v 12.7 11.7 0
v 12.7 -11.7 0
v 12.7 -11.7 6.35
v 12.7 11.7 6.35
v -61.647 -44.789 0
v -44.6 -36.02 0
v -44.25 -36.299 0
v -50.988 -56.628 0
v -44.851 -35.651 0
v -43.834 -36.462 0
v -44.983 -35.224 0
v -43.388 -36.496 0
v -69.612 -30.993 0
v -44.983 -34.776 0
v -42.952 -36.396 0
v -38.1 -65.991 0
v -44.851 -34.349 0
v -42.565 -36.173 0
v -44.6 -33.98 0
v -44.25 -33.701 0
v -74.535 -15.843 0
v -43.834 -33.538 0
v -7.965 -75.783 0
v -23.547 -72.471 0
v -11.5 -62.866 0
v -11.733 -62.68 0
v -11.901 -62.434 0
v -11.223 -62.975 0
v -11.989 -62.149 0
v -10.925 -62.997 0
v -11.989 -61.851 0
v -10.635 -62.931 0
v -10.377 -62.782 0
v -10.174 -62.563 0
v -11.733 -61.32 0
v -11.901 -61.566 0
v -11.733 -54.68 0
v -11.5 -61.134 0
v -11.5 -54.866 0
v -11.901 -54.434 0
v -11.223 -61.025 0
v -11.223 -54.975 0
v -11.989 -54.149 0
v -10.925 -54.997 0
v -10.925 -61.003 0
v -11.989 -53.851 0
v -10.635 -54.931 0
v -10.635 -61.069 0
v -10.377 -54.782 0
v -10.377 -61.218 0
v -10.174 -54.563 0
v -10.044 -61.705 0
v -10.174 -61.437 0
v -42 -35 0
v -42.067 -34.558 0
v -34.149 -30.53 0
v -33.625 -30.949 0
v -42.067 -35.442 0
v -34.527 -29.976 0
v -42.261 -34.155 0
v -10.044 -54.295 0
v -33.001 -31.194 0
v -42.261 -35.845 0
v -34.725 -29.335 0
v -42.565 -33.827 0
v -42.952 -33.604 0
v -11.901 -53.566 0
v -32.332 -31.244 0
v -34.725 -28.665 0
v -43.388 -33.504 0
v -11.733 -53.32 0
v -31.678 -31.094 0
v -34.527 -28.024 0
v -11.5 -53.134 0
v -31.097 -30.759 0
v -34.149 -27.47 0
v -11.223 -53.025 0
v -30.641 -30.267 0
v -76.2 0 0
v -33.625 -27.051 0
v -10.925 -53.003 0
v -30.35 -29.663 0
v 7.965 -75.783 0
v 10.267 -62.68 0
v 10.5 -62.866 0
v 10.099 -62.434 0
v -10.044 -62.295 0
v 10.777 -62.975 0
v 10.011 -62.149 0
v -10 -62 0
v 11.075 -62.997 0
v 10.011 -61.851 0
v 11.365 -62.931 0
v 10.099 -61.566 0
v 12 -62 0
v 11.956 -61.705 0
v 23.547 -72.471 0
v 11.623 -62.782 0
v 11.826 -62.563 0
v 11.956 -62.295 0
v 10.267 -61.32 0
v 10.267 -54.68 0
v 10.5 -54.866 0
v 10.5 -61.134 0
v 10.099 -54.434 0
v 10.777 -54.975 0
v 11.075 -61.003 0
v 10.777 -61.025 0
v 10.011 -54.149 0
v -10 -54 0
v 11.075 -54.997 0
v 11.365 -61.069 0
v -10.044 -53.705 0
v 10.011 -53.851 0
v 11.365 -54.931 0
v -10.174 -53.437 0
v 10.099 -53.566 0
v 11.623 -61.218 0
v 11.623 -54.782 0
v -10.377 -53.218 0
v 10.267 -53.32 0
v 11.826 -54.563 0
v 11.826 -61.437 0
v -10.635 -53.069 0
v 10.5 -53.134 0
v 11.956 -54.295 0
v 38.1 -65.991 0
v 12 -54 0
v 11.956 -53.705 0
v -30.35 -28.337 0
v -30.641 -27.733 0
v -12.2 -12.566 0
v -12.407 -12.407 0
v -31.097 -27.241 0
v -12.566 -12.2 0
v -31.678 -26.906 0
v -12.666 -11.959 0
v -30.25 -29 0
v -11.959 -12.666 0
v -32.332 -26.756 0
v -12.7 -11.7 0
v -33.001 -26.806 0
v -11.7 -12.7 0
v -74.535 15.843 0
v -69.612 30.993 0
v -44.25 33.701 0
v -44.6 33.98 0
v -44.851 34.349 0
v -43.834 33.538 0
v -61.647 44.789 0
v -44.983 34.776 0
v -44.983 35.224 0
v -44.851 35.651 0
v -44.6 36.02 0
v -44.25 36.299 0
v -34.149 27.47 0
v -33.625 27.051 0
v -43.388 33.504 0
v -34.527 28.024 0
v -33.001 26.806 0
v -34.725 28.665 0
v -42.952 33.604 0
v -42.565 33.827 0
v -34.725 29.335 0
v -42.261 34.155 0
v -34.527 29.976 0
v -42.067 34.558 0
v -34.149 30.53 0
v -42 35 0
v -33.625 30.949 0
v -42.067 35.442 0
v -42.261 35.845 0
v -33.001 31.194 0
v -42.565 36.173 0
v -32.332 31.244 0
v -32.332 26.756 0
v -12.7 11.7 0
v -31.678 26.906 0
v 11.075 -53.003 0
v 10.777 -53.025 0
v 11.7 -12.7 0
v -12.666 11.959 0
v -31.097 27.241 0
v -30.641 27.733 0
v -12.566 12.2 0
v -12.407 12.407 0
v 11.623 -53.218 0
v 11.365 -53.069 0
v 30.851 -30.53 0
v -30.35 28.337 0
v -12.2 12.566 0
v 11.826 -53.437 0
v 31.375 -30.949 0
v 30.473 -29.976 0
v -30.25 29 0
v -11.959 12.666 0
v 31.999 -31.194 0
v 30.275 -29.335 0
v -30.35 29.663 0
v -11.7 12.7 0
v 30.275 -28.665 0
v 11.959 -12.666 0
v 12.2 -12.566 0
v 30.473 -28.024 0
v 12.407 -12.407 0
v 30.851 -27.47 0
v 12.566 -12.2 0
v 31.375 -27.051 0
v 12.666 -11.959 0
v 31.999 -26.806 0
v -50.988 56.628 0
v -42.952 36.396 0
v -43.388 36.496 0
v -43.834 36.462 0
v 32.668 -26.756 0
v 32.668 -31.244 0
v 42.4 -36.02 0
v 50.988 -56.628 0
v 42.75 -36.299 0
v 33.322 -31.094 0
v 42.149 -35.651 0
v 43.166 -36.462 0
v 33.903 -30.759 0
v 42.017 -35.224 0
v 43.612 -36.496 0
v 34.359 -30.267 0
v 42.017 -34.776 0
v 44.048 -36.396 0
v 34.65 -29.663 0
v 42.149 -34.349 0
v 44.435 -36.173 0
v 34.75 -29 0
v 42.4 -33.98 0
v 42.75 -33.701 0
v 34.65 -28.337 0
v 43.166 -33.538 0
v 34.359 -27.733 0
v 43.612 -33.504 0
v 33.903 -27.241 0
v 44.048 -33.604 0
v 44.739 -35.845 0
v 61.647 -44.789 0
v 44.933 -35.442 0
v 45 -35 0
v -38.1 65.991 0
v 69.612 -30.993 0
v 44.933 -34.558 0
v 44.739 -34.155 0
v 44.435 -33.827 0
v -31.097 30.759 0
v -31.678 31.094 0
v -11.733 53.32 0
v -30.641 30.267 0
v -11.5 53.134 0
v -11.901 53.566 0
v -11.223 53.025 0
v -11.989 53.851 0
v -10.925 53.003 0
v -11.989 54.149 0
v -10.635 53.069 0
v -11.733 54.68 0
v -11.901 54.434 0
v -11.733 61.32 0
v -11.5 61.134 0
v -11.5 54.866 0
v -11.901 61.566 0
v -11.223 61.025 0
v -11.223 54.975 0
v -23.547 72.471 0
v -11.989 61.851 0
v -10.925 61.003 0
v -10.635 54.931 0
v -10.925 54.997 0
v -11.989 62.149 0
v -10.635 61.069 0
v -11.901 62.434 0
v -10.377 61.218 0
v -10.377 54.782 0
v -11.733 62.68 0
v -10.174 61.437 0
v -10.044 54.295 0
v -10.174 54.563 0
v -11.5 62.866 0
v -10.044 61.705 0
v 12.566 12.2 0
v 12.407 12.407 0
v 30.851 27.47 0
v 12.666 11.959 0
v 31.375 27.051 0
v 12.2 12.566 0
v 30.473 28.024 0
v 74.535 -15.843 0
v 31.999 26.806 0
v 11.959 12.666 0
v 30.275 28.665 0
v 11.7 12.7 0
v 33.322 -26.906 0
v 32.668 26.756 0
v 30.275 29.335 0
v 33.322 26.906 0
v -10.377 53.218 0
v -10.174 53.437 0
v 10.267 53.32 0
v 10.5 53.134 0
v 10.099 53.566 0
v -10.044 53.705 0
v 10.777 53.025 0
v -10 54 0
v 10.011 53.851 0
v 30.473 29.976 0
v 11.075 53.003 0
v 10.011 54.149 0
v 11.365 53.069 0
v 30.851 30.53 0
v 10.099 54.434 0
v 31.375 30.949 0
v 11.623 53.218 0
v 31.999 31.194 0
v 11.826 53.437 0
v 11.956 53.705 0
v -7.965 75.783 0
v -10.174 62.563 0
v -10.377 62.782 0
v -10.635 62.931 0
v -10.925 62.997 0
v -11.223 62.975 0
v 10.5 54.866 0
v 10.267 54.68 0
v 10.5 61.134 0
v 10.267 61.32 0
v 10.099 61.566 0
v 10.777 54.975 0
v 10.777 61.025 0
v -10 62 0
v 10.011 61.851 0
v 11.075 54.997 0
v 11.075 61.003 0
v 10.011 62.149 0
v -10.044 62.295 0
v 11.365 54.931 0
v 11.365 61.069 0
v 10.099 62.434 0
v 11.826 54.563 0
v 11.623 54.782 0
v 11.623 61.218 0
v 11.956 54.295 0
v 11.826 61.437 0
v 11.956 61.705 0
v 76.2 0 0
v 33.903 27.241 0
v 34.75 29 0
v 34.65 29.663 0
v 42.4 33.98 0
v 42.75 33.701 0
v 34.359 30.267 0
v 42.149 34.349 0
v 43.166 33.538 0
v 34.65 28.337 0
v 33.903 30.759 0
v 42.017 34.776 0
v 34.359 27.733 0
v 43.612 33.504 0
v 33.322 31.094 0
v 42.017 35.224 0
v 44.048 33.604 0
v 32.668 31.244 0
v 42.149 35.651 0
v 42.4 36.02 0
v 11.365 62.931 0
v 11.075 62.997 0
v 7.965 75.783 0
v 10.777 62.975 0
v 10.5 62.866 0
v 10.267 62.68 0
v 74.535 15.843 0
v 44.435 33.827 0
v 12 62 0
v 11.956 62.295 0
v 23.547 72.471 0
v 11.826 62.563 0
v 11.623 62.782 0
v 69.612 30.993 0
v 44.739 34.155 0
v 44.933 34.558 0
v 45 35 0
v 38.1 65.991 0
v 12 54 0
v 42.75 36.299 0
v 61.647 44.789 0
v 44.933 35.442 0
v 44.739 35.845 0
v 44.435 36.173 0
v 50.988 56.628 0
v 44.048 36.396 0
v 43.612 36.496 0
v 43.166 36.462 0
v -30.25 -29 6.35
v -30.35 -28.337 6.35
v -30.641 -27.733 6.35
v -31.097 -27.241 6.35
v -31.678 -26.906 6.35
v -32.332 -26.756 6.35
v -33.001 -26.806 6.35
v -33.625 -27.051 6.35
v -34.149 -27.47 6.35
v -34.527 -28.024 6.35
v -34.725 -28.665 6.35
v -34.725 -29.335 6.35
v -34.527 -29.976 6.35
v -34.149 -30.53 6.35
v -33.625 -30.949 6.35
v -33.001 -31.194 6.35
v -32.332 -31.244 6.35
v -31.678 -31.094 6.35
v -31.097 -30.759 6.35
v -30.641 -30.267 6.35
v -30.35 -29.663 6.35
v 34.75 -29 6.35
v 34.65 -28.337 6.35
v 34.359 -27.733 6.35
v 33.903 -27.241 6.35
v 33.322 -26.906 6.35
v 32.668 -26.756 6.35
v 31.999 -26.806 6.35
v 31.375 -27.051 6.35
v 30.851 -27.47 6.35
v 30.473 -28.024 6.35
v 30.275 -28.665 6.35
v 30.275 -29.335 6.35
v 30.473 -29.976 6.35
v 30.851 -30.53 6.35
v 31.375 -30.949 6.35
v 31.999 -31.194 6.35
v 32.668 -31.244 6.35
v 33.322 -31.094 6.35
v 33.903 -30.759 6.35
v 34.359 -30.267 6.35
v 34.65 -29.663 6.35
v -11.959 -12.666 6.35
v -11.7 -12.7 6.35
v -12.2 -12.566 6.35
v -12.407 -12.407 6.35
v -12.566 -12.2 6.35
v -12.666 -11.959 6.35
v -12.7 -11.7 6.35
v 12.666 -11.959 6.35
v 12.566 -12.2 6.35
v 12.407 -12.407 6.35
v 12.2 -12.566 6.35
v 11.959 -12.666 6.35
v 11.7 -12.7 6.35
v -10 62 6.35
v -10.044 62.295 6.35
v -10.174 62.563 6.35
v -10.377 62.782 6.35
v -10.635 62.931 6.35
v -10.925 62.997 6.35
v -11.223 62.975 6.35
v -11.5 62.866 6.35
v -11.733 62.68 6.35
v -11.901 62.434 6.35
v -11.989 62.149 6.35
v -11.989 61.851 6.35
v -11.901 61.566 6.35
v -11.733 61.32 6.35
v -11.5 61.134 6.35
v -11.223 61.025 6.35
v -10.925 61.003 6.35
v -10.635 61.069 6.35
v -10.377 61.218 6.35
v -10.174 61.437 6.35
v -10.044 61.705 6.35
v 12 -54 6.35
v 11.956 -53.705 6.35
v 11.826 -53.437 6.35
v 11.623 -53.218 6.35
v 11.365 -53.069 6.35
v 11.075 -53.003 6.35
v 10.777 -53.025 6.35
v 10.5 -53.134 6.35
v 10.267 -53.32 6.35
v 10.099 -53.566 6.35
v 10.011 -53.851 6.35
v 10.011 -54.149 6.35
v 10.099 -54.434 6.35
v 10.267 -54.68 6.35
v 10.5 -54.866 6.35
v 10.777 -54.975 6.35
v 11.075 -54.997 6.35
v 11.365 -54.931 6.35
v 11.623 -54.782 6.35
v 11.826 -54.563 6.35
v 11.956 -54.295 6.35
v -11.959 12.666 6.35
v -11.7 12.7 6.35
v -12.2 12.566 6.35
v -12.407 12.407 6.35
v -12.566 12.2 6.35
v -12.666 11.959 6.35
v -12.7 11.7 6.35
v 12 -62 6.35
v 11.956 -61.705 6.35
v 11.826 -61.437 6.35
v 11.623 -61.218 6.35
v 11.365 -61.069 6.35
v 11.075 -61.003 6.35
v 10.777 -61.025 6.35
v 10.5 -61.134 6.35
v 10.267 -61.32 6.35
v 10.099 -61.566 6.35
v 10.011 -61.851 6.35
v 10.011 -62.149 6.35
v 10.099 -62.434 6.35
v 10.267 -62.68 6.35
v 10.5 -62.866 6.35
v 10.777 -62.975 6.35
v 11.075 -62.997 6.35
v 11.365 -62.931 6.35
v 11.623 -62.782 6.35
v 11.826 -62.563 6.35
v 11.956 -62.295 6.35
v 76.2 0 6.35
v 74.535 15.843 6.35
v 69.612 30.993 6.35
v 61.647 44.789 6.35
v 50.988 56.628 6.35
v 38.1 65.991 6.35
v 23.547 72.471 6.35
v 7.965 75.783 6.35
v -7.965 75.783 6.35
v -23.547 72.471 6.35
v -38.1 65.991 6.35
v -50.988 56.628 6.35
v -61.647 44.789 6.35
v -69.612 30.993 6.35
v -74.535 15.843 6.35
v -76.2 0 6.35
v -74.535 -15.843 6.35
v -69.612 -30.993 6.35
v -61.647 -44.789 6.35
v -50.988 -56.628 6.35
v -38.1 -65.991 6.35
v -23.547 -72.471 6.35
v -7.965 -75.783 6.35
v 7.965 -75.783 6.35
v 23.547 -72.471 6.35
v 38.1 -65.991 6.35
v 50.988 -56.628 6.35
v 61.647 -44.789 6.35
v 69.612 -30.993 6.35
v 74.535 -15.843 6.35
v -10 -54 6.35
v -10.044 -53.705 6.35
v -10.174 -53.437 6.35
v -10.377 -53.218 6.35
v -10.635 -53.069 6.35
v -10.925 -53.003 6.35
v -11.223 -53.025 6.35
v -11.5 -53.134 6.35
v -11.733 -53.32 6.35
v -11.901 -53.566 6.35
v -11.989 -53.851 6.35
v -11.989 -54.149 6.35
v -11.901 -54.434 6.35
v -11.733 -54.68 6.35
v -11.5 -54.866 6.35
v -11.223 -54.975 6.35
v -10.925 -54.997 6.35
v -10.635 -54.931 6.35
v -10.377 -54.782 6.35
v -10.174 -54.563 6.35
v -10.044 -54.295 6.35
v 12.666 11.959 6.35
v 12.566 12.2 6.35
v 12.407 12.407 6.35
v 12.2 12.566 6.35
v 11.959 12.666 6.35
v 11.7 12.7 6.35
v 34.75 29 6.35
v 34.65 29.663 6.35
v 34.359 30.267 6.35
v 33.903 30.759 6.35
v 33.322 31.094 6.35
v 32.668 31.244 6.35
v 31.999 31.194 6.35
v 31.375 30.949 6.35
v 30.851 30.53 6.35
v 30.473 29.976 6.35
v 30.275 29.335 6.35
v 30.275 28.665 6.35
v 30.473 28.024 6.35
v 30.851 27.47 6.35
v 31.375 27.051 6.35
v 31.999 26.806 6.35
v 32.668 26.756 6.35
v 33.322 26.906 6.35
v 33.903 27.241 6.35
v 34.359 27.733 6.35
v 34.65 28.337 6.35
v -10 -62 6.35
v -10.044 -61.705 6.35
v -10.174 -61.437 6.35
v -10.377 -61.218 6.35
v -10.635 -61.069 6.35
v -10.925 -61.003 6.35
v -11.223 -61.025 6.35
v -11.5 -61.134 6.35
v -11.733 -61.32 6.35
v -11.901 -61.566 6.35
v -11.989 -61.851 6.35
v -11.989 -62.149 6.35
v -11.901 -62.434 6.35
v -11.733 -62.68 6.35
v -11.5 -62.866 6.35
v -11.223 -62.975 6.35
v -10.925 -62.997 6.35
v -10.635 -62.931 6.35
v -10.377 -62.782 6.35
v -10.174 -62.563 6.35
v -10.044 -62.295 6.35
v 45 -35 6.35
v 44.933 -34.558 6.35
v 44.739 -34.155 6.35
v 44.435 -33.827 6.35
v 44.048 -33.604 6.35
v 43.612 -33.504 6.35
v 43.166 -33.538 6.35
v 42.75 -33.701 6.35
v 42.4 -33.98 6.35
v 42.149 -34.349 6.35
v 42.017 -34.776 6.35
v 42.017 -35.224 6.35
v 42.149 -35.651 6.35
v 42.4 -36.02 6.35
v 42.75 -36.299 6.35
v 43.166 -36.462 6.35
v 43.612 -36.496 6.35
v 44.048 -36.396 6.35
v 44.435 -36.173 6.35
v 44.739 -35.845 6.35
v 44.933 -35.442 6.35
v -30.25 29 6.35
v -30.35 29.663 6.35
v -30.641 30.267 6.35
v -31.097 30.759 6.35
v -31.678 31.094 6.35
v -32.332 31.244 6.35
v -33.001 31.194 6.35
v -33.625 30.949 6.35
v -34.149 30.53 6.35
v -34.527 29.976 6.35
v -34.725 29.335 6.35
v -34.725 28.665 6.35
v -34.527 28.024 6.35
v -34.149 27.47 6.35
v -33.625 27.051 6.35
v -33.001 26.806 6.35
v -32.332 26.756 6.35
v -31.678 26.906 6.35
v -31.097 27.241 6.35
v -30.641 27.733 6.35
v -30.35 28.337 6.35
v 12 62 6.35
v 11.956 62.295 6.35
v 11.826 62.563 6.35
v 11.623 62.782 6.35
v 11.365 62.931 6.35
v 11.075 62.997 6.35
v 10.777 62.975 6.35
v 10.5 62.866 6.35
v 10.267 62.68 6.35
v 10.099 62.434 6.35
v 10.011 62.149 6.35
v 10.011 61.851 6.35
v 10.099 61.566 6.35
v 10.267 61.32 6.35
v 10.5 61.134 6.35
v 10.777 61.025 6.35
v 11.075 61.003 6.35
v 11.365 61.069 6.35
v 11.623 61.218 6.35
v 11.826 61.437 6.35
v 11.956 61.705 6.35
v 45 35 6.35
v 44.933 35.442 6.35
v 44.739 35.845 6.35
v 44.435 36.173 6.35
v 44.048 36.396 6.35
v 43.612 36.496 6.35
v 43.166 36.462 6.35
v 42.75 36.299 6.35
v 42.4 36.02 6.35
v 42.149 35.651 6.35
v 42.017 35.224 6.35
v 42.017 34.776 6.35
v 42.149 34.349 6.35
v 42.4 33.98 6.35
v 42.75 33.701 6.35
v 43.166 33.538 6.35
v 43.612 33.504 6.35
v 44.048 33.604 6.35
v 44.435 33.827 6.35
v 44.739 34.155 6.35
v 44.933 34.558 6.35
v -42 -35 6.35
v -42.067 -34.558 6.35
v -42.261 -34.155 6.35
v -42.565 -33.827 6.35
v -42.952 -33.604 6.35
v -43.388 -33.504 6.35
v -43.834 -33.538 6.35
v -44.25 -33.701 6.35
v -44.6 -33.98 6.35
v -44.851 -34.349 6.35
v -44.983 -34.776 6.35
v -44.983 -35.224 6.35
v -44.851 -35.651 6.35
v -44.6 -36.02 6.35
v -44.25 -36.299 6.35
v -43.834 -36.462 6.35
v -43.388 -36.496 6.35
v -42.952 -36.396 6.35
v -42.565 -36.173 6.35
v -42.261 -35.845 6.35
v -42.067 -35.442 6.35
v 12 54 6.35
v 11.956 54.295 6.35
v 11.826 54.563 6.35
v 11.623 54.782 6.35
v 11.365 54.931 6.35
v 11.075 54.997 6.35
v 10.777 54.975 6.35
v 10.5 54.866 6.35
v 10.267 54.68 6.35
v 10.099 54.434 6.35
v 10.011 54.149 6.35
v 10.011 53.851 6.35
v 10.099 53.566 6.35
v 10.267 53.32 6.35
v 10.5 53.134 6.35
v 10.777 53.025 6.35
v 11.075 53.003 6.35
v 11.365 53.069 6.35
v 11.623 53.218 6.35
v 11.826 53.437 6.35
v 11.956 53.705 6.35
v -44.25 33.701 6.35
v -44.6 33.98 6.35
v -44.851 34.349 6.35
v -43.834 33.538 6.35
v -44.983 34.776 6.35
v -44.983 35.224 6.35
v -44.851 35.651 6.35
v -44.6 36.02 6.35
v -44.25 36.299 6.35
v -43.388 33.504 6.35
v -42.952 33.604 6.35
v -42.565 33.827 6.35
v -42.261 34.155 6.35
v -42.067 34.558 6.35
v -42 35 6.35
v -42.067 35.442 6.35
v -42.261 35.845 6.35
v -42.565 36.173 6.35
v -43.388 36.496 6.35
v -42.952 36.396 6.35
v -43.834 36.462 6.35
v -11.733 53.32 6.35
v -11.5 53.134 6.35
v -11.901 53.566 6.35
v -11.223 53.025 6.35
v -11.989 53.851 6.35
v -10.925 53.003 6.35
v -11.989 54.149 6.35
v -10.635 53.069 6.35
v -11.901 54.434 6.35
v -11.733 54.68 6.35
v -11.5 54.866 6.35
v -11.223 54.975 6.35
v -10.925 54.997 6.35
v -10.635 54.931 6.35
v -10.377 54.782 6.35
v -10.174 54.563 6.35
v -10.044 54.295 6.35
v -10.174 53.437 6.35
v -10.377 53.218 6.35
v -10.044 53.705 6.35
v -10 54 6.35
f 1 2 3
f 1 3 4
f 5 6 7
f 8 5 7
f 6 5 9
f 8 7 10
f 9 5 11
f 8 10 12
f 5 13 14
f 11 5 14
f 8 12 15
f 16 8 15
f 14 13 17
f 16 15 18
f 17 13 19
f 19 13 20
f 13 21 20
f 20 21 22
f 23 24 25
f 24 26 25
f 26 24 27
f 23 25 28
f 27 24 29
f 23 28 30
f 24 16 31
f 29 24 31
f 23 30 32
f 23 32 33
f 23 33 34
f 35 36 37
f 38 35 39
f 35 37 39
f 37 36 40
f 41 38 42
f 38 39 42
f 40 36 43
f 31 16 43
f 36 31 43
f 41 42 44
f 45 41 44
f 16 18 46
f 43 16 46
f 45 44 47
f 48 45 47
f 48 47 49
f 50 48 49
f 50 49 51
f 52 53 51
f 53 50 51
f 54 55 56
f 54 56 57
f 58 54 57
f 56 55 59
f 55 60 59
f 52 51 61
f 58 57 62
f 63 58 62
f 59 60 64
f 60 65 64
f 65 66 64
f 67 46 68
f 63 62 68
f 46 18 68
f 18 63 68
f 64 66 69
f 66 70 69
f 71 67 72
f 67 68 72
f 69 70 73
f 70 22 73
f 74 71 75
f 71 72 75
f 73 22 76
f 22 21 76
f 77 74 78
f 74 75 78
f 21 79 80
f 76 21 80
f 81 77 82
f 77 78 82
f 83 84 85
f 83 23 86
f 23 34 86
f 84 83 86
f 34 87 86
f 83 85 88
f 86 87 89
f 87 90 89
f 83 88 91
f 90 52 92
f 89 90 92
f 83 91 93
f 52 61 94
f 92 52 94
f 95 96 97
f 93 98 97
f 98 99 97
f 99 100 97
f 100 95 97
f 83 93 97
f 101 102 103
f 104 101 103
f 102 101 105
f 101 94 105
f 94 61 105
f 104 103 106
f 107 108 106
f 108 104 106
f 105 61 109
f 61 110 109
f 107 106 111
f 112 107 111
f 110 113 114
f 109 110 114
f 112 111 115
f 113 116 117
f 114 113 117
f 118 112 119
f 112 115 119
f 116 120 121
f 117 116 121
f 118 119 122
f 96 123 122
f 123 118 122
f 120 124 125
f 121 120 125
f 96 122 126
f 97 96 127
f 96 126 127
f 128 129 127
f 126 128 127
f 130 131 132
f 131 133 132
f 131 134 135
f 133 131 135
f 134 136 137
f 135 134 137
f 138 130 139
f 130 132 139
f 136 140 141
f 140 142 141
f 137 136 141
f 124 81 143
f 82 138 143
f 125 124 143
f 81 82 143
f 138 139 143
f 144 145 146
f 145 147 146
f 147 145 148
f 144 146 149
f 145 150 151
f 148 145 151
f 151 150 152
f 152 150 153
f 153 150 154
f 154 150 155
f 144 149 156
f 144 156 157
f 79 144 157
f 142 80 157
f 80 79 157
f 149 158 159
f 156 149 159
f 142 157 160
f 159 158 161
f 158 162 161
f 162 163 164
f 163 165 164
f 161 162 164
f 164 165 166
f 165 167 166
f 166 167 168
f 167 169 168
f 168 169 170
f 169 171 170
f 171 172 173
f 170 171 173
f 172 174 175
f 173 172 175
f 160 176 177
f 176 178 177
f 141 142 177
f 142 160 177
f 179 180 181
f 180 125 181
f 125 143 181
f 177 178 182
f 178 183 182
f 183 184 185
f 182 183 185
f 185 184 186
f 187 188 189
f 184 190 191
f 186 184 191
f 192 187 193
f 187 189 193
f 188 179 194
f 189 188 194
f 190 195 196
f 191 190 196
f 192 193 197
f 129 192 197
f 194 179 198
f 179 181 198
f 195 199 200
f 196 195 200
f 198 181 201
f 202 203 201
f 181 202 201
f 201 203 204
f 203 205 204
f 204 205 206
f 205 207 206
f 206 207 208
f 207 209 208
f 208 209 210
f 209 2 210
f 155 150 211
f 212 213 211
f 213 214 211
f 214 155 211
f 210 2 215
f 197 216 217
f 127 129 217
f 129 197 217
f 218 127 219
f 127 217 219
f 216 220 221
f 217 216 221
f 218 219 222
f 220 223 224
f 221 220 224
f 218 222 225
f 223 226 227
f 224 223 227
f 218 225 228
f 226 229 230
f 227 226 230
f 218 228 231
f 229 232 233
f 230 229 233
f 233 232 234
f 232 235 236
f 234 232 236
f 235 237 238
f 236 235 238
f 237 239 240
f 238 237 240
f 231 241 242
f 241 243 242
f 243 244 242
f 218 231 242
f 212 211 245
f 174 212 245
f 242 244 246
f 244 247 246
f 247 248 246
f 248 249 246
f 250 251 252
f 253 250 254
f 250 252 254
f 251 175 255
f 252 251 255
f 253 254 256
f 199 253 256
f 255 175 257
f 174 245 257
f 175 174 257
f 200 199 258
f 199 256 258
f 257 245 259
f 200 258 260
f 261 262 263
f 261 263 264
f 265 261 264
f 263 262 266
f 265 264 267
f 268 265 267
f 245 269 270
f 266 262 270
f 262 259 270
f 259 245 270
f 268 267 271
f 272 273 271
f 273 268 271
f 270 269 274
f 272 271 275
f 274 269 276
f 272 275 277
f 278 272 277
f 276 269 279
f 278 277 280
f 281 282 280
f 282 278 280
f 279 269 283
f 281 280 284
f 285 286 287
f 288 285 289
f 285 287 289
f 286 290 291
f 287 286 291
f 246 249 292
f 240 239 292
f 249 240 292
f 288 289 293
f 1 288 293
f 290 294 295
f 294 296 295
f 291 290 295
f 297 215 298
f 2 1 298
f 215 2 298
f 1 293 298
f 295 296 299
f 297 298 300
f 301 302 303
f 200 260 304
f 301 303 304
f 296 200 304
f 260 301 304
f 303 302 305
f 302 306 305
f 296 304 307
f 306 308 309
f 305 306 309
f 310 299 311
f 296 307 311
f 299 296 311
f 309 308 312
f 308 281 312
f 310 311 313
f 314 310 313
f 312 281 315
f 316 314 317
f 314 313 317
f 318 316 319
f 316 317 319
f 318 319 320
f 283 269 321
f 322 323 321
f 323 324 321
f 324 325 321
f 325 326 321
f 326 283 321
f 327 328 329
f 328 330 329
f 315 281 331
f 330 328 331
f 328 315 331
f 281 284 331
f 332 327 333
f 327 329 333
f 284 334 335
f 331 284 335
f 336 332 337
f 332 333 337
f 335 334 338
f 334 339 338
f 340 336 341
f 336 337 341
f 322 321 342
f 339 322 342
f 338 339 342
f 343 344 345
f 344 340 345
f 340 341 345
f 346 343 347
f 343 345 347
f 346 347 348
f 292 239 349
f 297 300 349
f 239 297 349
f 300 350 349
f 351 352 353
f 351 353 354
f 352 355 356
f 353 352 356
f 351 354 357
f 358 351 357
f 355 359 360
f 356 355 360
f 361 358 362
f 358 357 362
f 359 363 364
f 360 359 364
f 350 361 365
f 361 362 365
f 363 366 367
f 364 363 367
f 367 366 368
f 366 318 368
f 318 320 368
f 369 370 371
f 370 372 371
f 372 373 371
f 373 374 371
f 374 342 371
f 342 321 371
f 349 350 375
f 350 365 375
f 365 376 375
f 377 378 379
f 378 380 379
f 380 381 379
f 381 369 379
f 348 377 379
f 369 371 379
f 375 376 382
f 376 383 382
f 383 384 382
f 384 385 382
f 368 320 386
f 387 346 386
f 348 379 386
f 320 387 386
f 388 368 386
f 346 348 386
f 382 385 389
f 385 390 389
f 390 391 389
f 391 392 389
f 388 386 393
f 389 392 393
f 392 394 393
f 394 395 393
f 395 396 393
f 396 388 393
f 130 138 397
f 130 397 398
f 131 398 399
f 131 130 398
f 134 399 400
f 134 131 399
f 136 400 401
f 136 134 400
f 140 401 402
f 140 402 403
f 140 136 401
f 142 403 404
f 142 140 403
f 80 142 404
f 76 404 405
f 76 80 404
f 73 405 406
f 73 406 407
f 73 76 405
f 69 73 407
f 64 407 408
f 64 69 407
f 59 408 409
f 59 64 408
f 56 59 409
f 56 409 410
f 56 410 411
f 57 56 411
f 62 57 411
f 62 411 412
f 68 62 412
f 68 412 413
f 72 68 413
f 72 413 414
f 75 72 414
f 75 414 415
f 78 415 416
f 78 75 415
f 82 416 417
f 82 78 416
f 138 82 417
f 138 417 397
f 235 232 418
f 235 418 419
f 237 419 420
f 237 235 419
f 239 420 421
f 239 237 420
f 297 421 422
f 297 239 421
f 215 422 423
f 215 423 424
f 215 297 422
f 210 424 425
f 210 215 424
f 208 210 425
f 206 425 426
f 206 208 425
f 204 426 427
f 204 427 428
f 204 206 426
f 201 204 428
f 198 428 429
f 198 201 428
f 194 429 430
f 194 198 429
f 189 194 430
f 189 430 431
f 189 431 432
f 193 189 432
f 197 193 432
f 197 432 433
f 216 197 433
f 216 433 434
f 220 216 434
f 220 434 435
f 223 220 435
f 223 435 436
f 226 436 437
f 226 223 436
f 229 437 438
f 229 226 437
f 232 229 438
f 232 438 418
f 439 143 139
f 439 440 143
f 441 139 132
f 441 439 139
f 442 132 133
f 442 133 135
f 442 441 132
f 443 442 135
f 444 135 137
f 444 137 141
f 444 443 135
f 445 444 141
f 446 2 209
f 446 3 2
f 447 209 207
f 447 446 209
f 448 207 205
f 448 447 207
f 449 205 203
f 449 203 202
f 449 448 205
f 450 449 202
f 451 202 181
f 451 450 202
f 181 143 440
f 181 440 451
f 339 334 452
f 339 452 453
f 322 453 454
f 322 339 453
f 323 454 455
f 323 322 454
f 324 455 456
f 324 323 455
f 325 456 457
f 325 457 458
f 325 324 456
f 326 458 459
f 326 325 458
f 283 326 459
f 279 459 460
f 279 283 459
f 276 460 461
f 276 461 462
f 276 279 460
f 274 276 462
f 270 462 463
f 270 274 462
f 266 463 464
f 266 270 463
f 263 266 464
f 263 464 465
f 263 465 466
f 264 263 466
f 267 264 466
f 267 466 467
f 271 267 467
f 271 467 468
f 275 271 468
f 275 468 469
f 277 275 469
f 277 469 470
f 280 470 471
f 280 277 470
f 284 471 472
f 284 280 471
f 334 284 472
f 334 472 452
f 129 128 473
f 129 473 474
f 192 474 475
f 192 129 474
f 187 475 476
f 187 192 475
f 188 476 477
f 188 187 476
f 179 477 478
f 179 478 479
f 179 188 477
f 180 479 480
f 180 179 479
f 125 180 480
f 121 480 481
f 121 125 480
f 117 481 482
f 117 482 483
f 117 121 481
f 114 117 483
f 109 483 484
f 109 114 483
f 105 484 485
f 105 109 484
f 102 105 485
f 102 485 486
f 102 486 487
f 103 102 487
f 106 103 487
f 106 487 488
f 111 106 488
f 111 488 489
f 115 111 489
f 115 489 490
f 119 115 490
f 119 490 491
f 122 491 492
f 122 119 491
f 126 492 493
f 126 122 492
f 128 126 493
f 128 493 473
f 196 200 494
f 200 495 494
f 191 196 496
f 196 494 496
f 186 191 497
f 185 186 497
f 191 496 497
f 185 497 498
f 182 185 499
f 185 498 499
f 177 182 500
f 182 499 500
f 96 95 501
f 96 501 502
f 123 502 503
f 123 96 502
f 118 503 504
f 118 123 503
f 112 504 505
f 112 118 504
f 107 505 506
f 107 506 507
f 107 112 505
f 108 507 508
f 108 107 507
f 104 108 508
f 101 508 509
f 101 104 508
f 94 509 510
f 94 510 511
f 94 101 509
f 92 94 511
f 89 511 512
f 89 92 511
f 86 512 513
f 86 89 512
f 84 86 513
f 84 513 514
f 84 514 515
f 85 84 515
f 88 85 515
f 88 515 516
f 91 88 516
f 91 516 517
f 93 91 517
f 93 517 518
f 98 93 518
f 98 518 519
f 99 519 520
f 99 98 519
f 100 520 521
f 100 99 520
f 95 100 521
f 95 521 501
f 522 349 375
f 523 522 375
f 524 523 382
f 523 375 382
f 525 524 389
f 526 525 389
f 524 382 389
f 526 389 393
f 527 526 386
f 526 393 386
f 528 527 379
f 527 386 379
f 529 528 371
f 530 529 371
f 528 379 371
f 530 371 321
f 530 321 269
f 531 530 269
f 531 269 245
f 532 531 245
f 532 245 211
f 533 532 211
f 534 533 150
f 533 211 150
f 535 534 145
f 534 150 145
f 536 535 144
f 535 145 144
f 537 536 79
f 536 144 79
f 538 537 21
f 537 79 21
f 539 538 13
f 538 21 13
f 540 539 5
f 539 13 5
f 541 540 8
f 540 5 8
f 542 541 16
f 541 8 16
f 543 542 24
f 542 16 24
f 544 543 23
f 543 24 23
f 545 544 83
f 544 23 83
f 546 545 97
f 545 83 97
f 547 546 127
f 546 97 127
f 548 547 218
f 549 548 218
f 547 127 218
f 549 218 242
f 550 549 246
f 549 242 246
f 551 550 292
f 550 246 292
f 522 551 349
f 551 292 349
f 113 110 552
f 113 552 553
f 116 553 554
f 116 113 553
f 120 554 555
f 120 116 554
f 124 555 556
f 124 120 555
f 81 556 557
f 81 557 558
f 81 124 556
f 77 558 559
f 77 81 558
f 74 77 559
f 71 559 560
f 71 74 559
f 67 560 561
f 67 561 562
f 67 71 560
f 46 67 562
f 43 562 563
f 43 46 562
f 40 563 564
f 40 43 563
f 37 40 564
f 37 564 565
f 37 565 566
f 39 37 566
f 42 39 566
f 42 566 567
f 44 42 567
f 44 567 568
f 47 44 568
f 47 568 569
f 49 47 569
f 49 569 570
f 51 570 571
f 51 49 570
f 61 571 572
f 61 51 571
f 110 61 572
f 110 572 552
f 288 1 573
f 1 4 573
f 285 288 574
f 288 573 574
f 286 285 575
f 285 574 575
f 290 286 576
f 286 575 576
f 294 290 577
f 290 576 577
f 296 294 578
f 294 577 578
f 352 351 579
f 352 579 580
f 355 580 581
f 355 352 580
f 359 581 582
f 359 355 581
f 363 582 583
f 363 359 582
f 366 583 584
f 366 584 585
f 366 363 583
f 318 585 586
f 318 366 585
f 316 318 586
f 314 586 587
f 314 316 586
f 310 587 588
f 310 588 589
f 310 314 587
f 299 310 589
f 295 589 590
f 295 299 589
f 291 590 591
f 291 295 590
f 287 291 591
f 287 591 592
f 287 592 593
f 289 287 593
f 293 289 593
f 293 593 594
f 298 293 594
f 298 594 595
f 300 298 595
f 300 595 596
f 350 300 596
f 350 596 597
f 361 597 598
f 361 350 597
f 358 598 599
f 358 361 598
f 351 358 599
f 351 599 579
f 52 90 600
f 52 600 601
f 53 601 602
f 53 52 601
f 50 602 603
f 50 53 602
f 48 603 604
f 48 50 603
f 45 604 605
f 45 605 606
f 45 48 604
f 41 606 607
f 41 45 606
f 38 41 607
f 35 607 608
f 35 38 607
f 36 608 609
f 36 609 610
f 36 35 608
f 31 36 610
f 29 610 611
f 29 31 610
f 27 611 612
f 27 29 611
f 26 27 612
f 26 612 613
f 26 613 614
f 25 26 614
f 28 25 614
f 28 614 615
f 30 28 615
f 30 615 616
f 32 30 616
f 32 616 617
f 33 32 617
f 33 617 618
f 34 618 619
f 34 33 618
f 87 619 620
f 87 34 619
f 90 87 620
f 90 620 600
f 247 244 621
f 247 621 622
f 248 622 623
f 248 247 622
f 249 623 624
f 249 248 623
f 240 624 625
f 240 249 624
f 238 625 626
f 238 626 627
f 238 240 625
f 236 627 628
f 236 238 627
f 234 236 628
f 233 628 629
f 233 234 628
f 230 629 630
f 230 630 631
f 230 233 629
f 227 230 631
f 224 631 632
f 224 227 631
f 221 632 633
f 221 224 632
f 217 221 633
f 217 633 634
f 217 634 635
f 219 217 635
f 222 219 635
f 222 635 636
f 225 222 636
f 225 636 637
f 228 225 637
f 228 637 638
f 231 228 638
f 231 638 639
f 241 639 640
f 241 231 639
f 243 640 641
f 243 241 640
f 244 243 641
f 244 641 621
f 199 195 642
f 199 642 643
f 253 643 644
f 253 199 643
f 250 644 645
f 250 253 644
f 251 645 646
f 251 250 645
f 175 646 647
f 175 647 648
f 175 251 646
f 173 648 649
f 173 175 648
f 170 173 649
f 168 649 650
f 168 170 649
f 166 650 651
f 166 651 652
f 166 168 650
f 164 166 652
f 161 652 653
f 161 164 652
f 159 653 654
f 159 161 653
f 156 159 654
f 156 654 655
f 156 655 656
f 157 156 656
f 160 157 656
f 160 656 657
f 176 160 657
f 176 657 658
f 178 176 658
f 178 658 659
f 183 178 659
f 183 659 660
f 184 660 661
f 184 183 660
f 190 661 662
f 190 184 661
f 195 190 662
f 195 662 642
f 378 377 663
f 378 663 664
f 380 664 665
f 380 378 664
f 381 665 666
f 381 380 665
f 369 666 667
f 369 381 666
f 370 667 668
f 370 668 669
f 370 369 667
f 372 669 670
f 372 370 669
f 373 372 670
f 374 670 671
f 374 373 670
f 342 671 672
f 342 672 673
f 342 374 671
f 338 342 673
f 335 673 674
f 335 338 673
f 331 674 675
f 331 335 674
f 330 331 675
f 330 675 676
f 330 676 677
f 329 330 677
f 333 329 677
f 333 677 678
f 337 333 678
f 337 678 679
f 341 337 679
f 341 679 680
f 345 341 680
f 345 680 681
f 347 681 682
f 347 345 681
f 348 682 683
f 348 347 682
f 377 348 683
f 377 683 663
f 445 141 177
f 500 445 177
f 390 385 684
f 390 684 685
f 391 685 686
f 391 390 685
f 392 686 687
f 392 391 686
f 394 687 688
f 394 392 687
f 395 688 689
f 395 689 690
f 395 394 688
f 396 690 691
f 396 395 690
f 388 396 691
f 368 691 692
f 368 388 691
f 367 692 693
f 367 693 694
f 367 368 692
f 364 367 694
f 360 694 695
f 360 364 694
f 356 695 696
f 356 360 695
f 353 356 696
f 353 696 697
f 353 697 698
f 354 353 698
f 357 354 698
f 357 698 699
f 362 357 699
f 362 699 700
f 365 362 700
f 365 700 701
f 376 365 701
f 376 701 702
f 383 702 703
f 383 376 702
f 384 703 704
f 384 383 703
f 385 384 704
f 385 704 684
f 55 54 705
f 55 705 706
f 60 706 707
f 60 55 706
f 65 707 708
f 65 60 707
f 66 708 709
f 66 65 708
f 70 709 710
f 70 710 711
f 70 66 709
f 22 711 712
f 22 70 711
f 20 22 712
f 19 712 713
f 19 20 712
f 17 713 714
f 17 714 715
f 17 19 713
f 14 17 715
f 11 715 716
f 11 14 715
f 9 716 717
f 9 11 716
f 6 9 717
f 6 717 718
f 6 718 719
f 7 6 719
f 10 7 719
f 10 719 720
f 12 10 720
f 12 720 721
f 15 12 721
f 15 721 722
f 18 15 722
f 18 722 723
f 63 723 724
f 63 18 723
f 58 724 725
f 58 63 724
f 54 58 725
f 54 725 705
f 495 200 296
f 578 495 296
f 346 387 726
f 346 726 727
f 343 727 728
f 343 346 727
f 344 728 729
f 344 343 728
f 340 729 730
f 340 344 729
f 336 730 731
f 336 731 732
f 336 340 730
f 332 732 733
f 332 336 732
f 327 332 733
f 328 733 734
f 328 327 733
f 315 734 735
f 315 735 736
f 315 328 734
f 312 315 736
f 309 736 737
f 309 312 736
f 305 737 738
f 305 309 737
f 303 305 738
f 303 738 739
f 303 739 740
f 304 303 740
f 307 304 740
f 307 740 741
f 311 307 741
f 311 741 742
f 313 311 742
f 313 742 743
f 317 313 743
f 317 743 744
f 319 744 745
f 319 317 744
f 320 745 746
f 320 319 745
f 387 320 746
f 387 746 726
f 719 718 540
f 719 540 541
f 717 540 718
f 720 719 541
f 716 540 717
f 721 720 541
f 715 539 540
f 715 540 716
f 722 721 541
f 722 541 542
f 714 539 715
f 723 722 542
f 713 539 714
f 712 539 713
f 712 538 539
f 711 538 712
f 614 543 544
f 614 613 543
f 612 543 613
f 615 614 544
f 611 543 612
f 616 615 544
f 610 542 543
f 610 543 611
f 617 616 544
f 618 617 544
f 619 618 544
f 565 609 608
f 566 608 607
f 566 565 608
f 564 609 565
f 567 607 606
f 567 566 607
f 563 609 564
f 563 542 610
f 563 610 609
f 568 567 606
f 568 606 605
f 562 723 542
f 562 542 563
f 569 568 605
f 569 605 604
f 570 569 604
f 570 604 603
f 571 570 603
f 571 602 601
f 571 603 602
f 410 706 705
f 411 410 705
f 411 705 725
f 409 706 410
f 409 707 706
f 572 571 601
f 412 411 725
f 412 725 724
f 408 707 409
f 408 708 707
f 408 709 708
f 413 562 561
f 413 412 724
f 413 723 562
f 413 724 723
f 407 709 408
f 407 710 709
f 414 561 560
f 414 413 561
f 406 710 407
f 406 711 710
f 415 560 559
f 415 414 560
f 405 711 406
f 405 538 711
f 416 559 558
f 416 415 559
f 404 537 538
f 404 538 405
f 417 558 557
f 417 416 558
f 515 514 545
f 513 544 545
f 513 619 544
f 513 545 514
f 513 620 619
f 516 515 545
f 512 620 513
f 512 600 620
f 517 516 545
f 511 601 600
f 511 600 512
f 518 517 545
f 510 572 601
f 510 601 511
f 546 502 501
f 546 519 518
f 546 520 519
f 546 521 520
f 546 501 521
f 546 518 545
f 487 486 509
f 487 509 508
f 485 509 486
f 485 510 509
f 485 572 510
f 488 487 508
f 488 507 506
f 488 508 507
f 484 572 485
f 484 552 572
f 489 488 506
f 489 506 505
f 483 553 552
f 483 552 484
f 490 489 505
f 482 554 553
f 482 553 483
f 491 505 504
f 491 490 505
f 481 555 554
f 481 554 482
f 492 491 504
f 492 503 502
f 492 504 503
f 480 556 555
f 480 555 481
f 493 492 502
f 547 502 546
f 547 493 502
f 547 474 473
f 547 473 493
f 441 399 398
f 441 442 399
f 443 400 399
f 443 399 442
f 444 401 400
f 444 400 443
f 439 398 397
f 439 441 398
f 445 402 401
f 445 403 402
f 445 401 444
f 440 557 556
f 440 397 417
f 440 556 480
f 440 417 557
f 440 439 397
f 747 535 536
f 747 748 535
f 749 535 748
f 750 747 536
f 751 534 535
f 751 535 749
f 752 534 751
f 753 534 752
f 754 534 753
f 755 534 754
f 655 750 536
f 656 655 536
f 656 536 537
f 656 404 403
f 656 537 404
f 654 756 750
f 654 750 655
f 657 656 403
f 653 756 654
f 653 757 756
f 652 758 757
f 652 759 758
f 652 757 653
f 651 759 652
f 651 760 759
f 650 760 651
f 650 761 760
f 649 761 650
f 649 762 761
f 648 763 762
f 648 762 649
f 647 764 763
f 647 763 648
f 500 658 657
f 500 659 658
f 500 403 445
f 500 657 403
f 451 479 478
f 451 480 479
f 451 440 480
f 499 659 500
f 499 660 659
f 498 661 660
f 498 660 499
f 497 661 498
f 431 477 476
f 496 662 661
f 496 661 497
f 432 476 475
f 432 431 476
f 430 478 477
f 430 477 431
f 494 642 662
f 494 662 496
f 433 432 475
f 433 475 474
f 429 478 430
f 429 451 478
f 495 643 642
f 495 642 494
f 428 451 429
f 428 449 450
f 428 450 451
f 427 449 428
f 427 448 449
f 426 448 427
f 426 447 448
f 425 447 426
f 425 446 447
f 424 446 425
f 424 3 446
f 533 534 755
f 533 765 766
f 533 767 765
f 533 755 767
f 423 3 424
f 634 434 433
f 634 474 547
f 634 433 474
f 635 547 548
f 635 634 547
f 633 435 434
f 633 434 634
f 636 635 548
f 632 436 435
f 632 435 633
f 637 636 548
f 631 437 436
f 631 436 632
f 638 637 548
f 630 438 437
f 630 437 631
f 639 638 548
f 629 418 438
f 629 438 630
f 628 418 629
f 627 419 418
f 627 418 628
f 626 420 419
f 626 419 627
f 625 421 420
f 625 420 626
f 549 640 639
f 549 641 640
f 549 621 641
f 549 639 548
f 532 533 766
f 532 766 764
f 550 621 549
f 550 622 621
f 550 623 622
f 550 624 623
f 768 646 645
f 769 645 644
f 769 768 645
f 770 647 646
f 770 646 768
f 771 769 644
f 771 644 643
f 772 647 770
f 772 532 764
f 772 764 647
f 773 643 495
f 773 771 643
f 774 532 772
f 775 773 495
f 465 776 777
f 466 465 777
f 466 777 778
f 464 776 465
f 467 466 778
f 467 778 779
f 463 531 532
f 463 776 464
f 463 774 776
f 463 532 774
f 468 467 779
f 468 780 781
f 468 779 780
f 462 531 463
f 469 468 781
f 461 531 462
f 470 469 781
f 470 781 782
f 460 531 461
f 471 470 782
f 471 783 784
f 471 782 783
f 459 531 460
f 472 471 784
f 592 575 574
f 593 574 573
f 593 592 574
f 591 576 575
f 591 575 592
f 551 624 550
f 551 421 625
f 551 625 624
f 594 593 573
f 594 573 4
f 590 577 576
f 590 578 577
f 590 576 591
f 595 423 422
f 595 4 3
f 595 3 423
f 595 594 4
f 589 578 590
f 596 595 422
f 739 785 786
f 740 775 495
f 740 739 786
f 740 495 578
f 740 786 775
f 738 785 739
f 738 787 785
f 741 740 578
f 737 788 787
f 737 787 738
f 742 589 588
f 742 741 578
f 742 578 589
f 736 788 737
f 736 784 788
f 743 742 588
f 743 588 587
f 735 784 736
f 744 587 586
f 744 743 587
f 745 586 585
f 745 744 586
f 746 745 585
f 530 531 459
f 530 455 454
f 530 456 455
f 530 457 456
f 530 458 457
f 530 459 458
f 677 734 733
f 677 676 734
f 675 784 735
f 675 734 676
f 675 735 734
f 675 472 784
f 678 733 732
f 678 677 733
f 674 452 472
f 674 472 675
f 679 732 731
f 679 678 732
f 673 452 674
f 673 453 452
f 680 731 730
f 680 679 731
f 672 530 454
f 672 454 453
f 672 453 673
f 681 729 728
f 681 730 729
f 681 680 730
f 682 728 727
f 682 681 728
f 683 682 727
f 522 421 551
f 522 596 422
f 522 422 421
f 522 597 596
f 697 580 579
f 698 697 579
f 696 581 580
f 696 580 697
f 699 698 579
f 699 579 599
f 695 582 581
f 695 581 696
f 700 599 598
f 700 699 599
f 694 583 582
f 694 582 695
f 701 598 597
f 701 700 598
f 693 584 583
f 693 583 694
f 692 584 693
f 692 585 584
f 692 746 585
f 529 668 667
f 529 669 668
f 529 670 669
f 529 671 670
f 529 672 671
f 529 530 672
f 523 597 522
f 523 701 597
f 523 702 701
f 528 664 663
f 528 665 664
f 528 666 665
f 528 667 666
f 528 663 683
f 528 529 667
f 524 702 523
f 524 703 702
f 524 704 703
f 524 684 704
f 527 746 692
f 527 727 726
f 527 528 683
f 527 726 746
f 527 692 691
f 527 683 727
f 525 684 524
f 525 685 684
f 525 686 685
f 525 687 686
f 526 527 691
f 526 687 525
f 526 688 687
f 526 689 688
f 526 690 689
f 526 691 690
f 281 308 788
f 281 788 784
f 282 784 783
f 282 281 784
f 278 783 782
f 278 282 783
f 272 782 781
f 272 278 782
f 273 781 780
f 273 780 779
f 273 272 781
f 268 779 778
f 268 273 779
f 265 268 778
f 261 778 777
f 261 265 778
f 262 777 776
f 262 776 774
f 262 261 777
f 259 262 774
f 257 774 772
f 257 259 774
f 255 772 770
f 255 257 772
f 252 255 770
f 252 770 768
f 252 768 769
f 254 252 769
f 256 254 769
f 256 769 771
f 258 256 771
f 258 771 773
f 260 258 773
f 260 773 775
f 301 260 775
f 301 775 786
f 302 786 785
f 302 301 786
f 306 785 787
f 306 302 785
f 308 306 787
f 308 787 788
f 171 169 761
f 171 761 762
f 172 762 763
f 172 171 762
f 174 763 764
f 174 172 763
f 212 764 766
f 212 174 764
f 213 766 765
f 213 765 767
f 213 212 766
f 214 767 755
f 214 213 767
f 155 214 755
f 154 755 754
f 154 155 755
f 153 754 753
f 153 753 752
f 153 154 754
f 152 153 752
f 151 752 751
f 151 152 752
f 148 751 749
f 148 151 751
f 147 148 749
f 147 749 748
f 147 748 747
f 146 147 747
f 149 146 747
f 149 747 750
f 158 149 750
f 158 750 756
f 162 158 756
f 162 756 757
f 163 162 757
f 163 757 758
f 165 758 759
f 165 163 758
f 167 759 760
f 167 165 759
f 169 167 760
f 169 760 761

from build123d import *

# Parameters (mm, degrees)
SKETCH1_R           = 76.2
SKETCH1_R_2         = 2.25
SKETCH1_R_3         = 1.5
SKETCH1_R_4         = 1
SKETCH1_W           = 25.4
SKETCH1_H           = 25.4
BOSS_EXTRUDE2_DEPTH = 6.35
FILLET3_R           = 1
FILLET4_R           = 1
FILLET5_R           = 1
FILLET6_R           = 1


with BuildPart() as part:
    # Sketch1 → Boss-Extrude2 (new body)
    with BuildSketch(Plane.XY):
        Circle(SKETCH1_R)
        with Locations((-32.5, 29)):
            Circle(SKETCH1_R_2, mode=Mode.SUBTRACT)
        with Locations((-32.5, -29)):
            Circle(SKETCH1_R_2, mode=Mode.SUBTRACT)
        with Locations((32.5, -29)):
            Circle(SKETCH1_R_2, mode=Mode.SUBTRACT)
        with Locations((32.5, 29)):
            Circle(SKETCH1_R_2, mode=Mode.SUBTRACT)
        with Locations((43.5, 35)):
            Circle(SKETCH1_R_3, mode=Mode.SUBTRACT)
        with Locations((-43.5, 35)):
            Circle(SKETCH1_R_3, mode=Mode.SUBTRACT)
        with Locations((43.5, -35)):
            Circle(SKETCH1_R_3, mode=Mode.SUBTRACT)
        with Locations((-43.5, -35)):
            Circle(SKETCH1_R_3, mode=Mode.SUBTRACT)
        with Locations((-11, 54)):
            Circle(SKETCH1_R_4, mode=Mode.SUBTRACT)
        with Locations((11, 54)):
            Circle(SKETCH1_R_4, mode=Mode.SUBTRACT)
        with Locations((11, 62)):
            Circle(SKETCH1_R_4, mode=Mode.SUBTRACT)
        with Locations((-11, 62)):
            Circle(SKETCH1_R_4, mode=Mode.SUBTRACT)
        with Locations((-11, -62)):
            Circle(SKETCH1_R_4, mode=Mode.SUBTRACT)
        with Locations((-11, -54)):
            Circle(SKETCH1_R_4, mode=Mode.SUBTRACT)
        with Locations((11, -62)):
            Circle(SKETCH1_R_4, mode=Mode.SUBTRACT)
        with Locations((11, -54)):
            Circle(SKETCH1_R_4, mode=Mode.SUBTRACT)
        Rectangle(SKETCH1_W, SKETCH1_H, mode=Mode.SUBTRACT)
    extrude(amount=BOSS_EXTRUDE2_DEPTH)

    # Fillet3
    fillet3_edges = [part.edges().sort_by_distance(p)[0] for p in [
        (-12.7, -12.7, 3.175),
    ]]
    fillet(fillet3_edges, radius=FILLET3_R)

    # Fillet4
    fillet4_edges = [part.edges().sort_by_distance(p)[0] for p in [
        (12.7, 12.7, 3.175),
    ]]
    fillet(fillet4_edges, radius=FILLET4_R)

    # Fillet5
    fillet5_edges = [part.edges().sort_by_distance(p)[0] for p in [
        (-12.7, 12.7, 3.175),
    ]]
    fillet(fillet5_edges, radius=FILLET5_R)

    # Fillet6
    fillet6_edges = [part.edges().sort_by_distance(p)[0] for p in [
        (12.7, -12.7, 3.175),
    ]]
    fillet(fillet6_edges, radius=FILLET6_R)


solid = part.part
